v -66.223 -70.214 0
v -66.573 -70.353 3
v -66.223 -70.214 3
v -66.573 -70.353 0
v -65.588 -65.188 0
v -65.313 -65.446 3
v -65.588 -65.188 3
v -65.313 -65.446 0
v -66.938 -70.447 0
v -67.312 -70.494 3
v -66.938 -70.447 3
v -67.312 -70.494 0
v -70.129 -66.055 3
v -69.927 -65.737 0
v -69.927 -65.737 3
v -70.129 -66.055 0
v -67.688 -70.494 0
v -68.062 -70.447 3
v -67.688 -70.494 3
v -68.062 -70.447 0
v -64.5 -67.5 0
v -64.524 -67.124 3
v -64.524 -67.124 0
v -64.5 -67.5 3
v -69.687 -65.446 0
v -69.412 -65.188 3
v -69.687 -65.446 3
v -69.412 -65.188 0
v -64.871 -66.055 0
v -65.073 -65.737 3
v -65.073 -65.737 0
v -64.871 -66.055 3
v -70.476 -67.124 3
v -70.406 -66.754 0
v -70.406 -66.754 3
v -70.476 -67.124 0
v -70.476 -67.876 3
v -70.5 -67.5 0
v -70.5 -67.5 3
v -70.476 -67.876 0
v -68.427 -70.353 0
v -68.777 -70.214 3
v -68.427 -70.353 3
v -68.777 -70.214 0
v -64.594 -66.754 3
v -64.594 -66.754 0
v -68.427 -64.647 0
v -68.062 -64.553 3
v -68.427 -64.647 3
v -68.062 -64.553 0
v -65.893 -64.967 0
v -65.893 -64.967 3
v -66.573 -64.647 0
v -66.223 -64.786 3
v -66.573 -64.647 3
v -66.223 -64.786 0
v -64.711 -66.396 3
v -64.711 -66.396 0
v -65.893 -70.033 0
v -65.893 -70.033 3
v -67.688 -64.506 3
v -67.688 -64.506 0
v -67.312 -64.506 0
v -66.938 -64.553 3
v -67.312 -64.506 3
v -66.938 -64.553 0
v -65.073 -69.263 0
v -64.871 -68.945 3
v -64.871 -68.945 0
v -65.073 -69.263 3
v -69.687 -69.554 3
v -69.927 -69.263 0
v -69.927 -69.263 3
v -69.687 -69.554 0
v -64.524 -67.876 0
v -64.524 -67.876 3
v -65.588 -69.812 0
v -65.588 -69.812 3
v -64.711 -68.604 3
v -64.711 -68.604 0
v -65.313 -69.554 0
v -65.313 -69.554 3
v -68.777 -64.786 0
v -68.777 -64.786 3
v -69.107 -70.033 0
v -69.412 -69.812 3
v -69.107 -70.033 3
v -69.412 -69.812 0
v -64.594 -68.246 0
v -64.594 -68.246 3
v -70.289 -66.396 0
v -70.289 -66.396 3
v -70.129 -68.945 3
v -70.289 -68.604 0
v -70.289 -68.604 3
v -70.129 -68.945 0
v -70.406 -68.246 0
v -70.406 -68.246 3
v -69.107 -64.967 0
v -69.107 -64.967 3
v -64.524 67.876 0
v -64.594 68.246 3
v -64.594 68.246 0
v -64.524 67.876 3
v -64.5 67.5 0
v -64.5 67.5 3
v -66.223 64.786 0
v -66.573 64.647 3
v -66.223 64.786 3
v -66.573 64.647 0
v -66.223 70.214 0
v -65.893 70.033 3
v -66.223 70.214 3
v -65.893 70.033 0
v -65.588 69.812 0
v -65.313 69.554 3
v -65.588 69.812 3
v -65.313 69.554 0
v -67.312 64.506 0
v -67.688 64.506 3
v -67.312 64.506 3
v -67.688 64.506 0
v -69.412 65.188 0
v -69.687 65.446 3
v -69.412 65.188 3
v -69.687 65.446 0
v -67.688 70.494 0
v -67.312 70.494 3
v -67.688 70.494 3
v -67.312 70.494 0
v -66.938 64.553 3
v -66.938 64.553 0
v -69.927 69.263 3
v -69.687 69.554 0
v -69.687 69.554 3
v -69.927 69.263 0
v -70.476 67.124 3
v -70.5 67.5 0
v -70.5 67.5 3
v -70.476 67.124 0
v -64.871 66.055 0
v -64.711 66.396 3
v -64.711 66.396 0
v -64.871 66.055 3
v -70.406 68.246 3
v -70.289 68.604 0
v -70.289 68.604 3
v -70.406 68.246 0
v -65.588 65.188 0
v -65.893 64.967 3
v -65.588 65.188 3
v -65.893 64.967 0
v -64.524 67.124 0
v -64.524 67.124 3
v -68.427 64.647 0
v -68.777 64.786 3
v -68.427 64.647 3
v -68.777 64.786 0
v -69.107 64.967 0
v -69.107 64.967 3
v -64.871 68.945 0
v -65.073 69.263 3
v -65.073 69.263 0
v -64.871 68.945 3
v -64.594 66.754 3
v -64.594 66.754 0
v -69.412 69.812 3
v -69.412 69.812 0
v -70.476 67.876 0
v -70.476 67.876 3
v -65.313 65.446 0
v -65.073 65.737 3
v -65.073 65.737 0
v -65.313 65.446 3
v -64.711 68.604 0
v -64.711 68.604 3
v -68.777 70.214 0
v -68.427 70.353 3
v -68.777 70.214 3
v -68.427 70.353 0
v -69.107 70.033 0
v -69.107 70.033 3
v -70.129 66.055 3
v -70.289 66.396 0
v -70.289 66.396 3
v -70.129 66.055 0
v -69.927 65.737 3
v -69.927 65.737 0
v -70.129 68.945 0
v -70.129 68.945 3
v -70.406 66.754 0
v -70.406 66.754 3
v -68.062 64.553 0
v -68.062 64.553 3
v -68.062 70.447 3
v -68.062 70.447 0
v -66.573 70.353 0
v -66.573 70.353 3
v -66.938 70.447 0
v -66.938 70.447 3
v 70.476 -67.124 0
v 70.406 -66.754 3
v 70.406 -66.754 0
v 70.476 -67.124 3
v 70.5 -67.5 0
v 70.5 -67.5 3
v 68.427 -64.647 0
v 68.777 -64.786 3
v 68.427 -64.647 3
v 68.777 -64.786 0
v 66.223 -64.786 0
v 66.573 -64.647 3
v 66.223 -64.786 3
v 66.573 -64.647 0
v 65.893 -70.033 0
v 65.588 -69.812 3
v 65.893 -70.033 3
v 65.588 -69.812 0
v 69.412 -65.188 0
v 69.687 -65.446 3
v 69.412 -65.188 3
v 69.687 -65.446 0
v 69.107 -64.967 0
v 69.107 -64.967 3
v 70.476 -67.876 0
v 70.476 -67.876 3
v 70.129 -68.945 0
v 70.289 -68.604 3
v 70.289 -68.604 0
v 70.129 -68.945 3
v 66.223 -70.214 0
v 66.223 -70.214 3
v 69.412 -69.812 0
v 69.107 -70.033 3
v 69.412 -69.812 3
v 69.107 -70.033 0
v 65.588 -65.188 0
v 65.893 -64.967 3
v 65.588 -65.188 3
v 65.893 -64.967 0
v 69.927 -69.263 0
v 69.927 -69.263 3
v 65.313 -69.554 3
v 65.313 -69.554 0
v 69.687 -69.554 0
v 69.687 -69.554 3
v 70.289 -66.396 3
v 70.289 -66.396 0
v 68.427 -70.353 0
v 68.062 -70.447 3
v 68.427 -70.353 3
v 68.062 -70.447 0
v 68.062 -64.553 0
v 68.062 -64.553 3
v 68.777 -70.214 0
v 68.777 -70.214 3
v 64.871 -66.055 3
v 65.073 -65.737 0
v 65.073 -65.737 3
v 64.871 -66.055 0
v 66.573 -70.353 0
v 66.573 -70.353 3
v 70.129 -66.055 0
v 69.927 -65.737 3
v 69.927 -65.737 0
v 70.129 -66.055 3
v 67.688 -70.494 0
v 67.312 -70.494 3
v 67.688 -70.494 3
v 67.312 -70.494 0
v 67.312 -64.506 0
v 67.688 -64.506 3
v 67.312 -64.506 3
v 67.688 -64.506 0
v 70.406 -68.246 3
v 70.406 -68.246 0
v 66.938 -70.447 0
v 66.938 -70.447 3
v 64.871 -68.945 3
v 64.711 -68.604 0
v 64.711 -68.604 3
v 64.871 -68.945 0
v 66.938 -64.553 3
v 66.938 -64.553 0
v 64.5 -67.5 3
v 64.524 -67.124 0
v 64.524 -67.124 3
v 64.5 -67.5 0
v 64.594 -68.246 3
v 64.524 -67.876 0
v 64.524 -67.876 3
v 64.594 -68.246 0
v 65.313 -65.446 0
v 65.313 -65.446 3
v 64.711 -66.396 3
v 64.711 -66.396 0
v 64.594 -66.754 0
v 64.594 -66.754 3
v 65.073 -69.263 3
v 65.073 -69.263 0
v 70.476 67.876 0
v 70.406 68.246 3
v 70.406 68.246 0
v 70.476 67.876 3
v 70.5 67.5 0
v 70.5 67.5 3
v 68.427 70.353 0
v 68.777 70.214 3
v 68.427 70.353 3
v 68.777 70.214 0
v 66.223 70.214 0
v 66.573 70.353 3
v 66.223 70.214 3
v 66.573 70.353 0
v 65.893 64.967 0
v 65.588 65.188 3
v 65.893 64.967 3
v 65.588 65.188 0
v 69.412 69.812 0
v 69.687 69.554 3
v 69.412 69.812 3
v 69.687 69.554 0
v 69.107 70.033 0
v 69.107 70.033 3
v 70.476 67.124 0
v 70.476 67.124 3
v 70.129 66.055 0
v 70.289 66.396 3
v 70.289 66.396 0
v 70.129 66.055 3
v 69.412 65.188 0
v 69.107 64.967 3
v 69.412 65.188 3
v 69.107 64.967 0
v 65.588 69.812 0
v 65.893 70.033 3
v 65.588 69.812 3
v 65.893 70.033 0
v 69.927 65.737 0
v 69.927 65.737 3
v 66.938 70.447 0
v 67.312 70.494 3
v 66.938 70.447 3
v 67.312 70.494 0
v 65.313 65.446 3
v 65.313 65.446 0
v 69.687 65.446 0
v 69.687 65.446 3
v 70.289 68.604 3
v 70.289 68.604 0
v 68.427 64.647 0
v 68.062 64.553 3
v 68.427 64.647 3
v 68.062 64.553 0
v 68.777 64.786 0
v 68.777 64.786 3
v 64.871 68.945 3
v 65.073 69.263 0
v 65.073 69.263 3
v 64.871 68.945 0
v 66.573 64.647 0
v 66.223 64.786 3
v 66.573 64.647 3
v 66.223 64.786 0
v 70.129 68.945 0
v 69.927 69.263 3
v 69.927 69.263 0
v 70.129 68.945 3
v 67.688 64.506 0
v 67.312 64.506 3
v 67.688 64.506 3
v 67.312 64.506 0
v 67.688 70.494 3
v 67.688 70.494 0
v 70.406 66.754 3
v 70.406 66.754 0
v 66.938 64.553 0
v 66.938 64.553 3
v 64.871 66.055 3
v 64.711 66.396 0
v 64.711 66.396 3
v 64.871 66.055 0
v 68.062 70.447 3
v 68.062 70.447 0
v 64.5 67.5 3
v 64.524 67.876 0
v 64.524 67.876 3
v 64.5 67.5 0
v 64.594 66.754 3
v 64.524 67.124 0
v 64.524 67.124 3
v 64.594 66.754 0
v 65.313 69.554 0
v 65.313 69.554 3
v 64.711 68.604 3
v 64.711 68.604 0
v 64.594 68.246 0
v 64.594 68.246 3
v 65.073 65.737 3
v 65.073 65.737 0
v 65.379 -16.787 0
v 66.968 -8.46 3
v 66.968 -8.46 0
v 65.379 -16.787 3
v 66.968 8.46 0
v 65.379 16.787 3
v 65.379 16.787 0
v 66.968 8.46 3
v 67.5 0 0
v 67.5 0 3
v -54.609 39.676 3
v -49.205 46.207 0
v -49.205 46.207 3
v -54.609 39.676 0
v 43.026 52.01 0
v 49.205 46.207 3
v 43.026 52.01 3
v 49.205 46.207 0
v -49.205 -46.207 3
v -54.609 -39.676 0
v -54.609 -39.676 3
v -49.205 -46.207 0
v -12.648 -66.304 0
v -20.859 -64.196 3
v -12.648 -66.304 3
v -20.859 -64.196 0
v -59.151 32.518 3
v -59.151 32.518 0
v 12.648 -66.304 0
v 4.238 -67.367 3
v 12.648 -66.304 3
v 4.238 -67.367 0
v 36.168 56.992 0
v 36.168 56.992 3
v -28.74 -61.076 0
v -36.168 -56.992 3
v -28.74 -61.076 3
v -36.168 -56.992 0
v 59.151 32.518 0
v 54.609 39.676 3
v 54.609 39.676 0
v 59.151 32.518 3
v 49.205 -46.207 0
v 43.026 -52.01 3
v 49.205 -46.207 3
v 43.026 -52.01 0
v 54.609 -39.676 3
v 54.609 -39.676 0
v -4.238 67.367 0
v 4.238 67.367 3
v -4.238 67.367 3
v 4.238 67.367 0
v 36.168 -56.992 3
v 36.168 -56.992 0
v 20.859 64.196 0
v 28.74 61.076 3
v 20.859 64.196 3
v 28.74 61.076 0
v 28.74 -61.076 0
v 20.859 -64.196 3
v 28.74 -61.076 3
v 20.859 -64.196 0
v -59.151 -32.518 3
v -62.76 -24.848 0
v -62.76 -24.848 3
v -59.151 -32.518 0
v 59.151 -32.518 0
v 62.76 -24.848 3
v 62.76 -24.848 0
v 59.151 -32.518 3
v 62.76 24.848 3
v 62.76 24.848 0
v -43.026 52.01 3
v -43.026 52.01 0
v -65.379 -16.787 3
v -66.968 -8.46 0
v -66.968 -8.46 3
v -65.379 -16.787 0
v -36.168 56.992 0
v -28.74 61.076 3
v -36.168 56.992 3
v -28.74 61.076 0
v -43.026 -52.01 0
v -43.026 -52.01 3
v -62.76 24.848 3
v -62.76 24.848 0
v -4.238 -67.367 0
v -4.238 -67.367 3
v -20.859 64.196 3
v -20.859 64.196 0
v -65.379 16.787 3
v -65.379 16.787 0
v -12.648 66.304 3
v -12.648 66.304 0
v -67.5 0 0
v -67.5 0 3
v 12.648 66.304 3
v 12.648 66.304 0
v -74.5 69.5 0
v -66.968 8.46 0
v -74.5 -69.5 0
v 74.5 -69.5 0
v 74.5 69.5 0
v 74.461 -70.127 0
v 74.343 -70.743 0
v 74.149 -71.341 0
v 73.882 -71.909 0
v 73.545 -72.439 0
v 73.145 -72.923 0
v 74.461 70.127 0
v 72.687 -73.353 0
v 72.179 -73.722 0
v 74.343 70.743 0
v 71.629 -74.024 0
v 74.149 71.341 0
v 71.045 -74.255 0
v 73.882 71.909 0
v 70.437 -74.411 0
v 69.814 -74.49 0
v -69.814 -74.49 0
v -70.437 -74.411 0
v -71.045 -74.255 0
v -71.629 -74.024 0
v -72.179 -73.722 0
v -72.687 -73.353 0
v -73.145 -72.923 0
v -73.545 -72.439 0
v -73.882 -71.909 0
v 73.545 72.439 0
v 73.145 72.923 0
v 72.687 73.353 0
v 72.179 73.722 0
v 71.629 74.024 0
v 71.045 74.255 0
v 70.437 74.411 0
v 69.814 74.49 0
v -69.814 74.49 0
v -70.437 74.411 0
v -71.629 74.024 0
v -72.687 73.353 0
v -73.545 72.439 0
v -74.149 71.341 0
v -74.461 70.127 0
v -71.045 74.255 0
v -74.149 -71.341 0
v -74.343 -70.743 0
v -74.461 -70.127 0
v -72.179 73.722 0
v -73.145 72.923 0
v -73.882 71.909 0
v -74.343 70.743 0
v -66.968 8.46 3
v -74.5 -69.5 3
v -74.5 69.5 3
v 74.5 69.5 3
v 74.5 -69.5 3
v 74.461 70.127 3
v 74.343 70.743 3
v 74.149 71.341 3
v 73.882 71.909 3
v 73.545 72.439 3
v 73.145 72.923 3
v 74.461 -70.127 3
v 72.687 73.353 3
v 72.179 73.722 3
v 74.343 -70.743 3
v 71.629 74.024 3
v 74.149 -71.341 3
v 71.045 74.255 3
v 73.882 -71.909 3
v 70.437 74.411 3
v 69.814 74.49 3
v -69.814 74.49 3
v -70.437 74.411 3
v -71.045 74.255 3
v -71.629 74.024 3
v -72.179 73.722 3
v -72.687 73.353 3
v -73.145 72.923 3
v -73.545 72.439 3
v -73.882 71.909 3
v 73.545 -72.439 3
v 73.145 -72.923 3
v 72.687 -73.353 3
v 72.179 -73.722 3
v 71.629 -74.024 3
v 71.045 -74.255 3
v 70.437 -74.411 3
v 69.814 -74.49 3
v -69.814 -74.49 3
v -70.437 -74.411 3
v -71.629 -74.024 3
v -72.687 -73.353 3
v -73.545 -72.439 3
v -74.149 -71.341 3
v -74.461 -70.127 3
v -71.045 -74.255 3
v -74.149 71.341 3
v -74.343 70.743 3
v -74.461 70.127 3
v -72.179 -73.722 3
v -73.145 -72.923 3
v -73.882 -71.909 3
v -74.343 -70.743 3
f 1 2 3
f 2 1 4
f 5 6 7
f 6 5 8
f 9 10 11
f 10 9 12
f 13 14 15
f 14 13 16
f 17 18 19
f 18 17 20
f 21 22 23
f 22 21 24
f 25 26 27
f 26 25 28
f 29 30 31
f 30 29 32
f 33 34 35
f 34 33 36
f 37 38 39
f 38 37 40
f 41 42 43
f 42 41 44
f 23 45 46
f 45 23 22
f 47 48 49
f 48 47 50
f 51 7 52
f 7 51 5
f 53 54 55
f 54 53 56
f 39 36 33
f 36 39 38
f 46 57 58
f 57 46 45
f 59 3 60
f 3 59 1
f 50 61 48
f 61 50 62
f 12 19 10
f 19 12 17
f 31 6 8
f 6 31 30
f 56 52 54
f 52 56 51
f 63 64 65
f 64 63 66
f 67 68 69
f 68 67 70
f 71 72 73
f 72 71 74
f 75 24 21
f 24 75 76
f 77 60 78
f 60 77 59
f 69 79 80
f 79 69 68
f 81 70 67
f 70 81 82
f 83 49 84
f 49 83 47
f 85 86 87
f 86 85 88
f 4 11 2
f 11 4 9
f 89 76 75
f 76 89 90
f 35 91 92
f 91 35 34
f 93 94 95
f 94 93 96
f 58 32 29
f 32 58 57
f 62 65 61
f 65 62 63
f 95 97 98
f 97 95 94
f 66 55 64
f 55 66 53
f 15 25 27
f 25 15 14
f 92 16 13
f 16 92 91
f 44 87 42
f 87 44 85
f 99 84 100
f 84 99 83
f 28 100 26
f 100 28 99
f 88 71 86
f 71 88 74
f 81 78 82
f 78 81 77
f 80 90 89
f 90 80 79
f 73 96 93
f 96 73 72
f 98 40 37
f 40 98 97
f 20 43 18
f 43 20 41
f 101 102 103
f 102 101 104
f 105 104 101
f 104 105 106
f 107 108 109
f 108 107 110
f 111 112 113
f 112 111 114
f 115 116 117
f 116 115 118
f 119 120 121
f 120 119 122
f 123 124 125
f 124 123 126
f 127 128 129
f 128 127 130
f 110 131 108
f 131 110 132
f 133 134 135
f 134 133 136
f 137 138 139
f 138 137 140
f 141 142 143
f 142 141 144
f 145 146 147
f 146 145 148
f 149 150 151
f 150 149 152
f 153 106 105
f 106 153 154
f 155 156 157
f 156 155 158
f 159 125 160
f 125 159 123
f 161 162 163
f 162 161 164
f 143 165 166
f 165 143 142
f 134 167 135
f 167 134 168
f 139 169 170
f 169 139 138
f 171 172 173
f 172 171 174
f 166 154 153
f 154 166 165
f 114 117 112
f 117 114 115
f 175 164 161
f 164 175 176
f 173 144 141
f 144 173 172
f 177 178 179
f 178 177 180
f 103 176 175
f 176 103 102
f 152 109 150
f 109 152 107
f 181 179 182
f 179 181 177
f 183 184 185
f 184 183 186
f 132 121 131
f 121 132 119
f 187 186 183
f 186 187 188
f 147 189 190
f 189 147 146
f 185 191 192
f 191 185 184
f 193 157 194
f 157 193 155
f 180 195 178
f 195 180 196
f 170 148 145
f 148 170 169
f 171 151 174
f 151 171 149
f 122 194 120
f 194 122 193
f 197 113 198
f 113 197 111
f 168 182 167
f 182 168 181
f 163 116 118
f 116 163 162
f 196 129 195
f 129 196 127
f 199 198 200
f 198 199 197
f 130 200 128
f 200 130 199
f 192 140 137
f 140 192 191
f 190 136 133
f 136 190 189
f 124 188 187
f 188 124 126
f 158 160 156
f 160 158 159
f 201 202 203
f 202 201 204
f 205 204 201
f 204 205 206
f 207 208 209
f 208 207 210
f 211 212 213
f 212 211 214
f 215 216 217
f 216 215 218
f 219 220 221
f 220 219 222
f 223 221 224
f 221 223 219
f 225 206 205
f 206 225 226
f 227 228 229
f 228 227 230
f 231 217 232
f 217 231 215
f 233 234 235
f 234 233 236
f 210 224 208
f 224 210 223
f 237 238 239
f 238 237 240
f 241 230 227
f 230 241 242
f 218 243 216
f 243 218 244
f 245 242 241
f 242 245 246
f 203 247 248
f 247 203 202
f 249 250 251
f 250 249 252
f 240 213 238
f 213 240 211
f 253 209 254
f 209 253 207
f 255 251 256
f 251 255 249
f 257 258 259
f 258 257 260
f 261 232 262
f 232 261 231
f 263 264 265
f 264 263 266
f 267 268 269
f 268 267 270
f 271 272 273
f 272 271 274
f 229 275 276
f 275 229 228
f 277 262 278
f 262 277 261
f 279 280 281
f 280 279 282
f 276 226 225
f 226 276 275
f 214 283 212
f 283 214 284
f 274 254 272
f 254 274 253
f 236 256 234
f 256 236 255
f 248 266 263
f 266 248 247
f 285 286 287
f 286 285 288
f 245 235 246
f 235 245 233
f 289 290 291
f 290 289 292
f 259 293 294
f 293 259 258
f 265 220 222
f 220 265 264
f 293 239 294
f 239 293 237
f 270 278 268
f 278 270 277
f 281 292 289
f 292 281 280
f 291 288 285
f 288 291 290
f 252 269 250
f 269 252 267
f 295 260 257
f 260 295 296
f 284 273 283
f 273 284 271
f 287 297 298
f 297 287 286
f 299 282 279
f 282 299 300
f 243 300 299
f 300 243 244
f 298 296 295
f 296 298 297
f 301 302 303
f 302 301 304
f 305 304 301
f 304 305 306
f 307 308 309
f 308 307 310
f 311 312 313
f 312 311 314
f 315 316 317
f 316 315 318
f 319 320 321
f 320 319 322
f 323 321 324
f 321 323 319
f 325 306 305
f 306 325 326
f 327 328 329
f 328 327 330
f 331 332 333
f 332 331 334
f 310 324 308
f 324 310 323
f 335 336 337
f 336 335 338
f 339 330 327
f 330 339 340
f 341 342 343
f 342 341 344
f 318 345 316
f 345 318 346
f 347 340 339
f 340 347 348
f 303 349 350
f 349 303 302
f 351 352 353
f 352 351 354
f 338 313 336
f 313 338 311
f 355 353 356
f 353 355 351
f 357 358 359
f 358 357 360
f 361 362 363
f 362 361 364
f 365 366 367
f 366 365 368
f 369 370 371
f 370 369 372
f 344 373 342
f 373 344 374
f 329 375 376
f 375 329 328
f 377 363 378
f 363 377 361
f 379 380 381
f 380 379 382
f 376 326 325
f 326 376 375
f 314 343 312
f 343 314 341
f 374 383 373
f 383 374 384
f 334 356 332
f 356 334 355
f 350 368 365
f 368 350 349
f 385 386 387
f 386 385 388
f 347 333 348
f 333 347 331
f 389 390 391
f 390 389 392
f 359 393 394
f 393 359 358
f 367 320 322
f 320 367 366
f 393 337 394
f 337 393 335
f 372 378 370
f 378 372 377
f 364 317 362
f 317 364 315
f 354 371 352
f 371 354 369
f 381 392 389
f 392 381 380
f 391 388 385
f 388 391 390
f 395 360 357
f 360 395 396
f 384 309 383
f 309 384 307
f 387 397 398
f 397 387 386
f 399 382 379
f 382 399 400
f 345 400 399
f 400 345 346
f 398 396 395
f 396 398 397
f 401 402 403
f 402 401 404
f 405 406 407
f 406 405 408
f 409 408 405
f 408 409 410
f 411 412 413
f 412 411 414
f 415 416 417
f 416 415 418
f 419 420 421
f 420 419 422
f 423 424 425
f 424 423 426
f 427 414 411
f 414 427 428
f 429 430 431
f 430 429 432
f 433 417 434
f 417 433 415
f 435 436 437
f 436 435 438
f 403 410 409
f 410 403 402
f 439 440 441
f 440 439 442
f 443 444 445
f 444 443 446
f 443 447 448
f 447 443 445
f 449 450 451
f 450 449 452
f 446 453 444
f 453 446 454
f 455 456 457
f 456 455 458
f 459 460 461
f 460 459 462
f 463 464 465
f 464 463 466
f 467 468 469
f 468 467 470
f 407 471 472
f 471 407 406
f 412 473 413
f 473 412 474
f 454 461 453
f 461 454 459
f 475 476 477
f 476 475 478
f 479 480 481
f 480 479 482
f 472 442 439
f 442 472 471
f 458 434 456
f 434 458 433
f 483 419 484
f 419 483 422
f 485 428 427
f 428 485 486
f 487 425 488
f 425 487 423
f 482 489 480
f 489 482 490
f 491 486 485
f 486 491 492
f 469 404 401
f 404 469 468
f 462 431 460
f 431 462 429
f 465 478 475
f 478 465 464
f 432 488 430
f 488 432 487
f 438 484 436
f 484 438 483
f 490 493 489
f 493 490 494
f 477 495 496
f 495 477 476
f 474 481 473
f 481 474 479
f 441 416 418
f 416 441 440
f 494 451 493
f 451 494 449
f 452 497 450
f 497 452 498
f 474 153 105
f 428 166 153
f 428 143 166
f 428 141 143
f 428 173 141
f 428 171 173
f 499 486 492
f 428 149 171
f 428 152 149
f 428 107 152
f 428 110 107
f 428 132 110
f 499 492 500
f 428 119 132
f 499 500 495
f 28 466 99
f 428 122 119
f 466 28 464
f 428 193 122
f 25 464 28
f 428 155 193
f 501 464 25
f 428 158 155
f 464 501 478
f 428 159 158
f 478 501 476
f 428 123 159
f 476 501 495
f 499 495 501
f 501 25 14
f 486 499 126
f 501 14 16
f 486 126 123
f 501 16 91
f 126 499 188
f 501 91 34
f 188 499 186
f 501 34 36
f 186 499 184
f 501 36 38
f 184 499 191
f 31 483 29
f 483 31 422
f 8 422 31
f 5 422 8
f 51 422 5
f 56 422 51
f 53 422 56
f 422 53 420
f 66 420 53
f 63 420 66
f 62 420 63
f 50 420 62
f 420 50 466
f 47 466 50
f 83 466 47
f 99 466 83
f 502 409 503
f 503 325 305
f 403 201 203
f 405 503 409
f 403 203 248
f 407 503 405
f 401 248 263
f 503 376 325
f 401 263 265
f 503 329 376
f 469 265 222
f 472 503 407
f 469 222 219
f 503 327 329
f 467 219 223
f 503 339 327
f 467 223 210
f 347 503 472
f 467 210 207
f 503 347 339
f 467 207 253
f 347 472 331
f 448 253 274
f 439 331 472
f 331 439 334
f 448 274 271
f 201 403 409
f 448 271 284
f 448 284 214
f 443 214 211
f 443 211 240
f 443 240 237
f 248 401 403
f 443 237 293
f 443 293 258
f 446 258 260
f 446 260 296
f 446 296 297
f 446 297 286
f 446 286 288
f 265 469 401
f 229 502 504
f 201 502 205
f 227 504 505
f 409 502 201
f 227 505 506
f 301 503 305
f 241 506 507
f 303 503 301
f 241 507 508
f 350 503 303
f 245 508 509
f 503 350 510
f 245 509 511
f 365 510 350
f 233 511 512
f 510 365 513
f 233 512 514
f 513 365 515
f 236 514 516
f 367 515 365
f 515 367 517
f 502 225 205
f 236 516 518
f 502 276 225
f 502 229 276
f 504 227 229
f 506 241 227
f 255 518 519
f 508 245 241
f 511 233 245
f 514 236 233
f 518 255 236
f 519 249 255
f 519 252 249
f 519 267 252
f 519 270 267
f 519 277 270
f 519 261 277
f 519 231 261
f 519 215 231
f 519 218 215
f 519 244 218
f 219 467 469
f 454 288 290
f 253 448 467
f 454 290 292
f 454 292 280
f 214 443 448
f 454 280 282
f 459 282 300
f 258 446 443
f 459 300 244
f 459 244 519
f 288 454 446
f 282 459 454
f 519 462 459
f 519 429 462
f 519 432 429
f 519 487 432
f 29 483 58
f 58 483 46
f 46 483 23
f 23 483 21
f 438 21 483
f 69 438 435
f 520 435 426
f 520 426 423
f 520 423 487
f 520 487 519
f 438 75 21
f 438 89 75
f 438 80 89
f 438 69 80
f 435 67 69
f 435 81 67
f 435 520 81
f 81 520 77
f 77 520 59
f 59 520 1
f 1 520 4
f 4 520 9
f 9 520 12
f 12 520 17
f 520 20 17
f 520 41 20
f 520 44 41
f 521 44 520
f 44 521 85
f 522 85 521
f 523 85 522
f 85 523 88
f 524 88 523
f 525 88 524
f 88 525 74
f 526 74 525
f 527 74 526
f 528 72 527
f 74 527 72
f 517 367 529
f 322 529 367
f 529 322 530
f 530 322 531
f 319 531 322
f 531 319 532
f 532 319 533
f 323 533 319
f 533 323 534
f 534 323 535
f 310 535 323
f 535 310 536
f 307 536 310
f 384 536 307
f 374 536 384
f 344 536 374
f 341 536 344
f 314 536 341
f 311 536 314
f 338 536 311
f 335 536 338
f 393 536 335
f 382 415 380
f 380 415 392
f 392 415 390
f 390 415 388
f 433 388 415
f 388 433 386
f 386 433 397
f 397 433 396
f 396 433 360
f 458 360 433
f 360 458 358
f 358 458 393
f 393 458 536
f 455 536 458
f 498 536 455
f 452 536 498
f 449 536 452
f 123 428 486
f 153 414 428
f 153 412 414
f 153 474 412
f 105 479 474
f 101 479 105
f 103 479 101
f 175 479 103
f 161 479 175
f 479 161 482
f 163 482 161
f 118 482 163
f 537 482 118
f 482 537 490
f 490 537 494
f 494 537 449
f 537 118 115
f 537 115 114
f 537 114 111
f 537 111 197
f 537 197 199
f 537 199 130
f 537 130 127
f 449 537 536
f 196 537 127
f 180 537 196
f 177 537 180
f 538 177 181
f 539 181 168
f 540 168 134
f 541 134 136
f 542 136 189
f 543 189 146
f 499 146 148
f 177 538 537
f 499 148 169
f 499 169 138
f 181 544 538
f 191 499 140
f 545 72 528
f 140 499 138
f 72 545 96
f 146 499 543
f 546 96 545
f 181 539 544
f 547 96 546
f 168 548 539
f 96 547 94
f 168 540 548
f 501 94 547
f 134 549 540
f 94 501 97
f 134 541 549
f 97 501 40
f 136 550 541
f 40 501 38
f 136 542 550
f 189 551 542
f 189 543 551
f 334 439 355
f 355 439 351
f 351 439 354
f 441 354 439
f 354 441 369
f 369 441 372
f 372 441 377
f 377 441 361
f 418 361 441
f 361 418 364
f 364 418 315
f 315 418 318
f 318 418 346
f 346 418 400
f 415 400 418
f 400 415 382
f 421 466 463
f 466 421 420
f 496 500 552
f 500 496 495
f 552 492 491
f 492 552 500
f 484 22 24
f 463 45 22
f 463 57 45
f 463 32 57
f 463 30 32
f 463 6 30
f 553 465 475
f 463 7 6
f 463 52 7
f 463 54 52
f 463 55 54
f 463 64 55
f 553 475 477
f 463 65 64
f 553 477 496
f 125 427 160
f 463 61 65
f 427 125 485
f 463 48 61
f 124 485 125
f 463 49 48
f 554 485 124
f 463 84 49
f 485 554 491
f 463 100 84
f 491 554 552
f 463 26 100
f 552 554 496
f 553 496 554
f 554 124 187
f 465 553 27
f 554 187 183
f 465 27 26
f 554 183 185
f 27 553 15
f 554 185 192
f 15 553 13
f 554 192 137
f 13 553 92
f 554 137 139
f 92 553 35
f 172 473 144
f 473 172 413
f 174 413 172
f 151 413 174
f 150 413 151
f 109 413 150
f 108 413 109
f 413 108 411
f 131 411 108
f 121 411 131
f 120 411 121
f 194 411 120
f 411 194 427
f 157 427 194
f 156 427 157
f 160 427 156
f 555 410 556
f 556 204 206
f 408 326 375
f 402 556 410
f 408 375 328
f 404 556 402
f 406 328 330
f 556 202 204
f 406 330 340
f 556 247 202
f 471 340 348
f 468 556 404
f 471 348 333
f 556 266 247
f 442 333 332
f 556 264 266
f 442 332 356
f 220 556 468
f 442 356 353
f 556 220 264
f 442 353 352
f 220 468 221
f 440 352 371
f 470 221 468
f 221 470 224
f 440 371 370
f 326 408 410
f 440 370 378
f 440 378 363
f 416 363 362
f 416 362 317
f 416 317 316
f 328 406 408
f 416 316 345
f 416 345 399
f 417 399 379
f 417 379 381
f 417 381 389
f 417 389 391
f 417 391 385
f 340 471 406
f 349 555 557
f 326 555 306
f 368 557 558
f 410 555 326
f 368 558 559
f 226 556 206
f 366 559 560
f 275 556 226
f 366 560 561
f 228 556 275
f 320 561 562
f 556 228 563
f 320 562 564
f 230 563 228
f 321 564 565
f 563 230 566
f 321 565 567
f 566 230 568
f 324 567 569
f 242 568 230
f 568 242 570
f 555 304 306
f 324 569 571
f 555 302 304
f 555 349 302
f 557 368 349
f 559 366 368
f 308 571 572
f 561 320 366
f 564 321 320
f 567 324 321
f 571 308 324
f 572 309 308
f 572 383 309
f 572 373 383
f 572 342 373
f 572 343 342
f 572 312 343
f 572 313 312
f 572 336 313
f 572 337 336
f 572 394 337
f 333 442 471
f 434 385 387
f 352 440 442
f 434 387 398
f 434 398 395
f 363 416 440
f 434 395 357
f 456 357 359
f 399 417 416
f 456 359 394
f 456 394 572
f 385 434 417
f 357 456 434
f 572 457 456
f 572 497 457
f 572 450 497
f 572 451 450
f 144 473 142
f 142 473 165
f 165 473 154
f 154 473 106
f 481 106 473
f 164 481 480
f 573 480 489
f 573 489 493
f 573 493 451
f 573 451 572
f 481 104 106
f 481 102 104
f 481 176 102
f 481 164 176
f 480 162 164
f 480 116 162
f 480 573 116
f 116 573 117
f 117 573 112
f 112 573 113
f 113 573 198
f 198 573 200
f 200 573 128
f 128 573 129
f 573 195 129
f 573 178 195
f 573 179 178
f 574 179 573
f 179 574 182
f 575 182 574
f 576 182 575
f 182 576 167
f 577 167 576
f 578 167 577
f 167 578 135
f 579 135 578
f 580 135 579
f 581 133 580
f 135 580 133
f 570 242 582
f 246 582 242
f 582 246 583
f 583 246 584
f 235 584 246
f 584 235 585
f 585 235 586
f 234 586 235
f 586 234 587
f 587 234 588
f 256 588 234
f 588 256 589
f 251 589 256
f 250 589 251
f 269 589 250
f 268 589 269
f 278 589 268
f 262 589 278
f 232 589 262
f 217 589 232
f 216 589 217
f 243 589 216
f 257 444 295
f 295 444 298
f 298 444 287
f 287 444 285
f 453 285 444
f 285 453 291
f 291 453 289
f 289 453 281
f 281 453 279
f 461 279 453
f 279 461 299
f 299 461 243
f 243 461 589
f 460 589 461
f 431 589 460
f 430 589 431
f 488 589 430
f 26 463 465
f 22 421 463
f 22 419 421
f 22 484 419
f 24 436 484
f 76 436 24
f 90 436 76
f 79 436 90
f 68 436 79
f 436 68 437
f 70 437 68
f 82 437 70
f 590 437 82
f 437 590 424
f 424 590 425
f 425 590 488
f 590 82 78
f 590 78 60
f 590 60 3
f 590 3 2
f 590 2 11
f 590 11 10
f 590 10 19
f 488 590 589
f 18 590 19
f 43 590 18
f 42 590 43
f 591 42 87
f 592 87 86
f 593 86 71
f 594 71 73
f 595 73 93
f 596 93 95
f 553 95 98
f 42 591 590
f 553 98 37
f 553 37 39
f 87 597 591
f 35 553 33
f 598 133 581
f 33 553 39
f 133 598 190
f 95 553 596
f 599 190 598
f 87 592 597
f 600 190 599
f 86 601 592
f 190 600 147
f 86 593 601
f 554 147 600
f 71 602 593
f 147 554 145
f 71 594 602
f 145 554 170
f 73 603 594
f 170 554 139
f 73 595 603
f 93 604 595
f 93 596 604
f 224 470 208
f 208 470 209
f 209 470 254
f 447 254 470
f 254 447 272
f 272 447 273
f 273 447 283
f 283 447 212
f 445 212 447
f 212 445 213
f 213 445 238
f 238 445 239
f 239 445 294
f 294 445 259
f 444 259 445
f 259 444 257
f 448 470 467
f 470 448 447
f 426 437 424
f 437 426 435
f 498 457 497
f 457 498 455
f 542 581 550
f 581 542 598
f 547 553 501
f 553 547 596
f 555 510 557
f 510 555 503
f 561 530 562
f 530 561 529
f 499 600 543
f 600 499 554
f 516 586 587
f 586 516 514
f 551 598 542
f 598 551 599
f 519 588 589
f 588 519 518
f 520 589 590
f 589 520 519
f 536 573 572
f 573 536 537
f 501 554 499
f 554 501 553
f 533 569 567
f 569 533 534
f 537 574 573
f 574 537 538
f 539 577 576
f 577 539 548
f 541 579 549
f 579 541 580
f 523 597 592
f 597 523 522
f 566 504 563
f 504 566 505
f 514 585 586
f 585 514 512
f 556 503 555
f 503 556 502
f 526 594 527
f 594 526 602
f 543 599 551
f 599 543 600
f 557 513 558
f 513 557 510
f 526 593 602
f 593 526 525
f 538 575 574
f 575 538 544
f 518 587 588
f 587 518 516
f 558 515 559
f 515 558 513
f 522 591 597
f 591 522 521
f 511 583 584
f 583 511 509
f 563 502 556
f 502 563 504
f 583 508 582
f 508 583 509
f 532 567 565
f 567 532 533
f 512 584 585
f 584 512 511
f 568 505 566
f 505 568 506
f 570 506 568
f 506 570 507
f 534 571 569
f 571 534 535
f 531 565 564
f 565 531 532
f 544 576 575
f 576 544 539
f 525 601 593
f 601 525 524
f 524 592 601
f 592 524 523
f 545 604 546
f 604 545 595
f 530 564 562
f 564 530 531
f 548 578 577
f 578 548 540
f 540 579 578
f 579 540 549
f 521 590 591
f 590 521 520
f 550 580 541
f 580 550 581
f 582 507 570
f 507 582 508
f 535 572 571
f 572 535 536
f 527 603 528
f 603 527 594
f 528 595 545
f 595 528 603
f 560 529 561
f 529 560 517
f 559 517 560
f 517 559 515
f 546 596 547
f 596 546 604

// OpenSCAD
$fn = 50;


difference() {
	union() {
		hull() {
			translate(v = [-69.5000000000, 69.5000000000, 0]) {
				cylinder(h = 3, r = 5);
			}
			translate(v = [69.5000000000, 69.5000000000, 0]) {
				cylinder(h = 3, r = 5);
			}
			translate(v = [-69.5000000000, -69.5000000000, 0]) {
				cylinder(h = 3, r = 5);
			}
			translate(v = [69.5000000000, -69.5000000000, 0]) {
				cylinder(h = 3, r = 5);
			}
		}
	}
	union() {
		#translate(v = [-67.5000000000, -67.5000000000, -100.0000000000]) {
			cylinder(h = 200, r = 3.0000000000);
		}
		#translate(v = [-67.5000000000, 67.5000000000, -100.0000000000]) {
			cylinder(h = 200, r = 3.0000000000);
		}
		#translate(v = [67.5000000000, -67.5000000000, -100.0000000000]) {
			cylinder(h = 200, r = 3.0000000000);
		}
		#translate(v = [67.5000000000, 67.5000000000, -100.0000000000]) {
			cylinder(h = 200, r = 3.0000000000);
		}
		#cylinder(h = 3, r = 67.5000000000);
	}
}
